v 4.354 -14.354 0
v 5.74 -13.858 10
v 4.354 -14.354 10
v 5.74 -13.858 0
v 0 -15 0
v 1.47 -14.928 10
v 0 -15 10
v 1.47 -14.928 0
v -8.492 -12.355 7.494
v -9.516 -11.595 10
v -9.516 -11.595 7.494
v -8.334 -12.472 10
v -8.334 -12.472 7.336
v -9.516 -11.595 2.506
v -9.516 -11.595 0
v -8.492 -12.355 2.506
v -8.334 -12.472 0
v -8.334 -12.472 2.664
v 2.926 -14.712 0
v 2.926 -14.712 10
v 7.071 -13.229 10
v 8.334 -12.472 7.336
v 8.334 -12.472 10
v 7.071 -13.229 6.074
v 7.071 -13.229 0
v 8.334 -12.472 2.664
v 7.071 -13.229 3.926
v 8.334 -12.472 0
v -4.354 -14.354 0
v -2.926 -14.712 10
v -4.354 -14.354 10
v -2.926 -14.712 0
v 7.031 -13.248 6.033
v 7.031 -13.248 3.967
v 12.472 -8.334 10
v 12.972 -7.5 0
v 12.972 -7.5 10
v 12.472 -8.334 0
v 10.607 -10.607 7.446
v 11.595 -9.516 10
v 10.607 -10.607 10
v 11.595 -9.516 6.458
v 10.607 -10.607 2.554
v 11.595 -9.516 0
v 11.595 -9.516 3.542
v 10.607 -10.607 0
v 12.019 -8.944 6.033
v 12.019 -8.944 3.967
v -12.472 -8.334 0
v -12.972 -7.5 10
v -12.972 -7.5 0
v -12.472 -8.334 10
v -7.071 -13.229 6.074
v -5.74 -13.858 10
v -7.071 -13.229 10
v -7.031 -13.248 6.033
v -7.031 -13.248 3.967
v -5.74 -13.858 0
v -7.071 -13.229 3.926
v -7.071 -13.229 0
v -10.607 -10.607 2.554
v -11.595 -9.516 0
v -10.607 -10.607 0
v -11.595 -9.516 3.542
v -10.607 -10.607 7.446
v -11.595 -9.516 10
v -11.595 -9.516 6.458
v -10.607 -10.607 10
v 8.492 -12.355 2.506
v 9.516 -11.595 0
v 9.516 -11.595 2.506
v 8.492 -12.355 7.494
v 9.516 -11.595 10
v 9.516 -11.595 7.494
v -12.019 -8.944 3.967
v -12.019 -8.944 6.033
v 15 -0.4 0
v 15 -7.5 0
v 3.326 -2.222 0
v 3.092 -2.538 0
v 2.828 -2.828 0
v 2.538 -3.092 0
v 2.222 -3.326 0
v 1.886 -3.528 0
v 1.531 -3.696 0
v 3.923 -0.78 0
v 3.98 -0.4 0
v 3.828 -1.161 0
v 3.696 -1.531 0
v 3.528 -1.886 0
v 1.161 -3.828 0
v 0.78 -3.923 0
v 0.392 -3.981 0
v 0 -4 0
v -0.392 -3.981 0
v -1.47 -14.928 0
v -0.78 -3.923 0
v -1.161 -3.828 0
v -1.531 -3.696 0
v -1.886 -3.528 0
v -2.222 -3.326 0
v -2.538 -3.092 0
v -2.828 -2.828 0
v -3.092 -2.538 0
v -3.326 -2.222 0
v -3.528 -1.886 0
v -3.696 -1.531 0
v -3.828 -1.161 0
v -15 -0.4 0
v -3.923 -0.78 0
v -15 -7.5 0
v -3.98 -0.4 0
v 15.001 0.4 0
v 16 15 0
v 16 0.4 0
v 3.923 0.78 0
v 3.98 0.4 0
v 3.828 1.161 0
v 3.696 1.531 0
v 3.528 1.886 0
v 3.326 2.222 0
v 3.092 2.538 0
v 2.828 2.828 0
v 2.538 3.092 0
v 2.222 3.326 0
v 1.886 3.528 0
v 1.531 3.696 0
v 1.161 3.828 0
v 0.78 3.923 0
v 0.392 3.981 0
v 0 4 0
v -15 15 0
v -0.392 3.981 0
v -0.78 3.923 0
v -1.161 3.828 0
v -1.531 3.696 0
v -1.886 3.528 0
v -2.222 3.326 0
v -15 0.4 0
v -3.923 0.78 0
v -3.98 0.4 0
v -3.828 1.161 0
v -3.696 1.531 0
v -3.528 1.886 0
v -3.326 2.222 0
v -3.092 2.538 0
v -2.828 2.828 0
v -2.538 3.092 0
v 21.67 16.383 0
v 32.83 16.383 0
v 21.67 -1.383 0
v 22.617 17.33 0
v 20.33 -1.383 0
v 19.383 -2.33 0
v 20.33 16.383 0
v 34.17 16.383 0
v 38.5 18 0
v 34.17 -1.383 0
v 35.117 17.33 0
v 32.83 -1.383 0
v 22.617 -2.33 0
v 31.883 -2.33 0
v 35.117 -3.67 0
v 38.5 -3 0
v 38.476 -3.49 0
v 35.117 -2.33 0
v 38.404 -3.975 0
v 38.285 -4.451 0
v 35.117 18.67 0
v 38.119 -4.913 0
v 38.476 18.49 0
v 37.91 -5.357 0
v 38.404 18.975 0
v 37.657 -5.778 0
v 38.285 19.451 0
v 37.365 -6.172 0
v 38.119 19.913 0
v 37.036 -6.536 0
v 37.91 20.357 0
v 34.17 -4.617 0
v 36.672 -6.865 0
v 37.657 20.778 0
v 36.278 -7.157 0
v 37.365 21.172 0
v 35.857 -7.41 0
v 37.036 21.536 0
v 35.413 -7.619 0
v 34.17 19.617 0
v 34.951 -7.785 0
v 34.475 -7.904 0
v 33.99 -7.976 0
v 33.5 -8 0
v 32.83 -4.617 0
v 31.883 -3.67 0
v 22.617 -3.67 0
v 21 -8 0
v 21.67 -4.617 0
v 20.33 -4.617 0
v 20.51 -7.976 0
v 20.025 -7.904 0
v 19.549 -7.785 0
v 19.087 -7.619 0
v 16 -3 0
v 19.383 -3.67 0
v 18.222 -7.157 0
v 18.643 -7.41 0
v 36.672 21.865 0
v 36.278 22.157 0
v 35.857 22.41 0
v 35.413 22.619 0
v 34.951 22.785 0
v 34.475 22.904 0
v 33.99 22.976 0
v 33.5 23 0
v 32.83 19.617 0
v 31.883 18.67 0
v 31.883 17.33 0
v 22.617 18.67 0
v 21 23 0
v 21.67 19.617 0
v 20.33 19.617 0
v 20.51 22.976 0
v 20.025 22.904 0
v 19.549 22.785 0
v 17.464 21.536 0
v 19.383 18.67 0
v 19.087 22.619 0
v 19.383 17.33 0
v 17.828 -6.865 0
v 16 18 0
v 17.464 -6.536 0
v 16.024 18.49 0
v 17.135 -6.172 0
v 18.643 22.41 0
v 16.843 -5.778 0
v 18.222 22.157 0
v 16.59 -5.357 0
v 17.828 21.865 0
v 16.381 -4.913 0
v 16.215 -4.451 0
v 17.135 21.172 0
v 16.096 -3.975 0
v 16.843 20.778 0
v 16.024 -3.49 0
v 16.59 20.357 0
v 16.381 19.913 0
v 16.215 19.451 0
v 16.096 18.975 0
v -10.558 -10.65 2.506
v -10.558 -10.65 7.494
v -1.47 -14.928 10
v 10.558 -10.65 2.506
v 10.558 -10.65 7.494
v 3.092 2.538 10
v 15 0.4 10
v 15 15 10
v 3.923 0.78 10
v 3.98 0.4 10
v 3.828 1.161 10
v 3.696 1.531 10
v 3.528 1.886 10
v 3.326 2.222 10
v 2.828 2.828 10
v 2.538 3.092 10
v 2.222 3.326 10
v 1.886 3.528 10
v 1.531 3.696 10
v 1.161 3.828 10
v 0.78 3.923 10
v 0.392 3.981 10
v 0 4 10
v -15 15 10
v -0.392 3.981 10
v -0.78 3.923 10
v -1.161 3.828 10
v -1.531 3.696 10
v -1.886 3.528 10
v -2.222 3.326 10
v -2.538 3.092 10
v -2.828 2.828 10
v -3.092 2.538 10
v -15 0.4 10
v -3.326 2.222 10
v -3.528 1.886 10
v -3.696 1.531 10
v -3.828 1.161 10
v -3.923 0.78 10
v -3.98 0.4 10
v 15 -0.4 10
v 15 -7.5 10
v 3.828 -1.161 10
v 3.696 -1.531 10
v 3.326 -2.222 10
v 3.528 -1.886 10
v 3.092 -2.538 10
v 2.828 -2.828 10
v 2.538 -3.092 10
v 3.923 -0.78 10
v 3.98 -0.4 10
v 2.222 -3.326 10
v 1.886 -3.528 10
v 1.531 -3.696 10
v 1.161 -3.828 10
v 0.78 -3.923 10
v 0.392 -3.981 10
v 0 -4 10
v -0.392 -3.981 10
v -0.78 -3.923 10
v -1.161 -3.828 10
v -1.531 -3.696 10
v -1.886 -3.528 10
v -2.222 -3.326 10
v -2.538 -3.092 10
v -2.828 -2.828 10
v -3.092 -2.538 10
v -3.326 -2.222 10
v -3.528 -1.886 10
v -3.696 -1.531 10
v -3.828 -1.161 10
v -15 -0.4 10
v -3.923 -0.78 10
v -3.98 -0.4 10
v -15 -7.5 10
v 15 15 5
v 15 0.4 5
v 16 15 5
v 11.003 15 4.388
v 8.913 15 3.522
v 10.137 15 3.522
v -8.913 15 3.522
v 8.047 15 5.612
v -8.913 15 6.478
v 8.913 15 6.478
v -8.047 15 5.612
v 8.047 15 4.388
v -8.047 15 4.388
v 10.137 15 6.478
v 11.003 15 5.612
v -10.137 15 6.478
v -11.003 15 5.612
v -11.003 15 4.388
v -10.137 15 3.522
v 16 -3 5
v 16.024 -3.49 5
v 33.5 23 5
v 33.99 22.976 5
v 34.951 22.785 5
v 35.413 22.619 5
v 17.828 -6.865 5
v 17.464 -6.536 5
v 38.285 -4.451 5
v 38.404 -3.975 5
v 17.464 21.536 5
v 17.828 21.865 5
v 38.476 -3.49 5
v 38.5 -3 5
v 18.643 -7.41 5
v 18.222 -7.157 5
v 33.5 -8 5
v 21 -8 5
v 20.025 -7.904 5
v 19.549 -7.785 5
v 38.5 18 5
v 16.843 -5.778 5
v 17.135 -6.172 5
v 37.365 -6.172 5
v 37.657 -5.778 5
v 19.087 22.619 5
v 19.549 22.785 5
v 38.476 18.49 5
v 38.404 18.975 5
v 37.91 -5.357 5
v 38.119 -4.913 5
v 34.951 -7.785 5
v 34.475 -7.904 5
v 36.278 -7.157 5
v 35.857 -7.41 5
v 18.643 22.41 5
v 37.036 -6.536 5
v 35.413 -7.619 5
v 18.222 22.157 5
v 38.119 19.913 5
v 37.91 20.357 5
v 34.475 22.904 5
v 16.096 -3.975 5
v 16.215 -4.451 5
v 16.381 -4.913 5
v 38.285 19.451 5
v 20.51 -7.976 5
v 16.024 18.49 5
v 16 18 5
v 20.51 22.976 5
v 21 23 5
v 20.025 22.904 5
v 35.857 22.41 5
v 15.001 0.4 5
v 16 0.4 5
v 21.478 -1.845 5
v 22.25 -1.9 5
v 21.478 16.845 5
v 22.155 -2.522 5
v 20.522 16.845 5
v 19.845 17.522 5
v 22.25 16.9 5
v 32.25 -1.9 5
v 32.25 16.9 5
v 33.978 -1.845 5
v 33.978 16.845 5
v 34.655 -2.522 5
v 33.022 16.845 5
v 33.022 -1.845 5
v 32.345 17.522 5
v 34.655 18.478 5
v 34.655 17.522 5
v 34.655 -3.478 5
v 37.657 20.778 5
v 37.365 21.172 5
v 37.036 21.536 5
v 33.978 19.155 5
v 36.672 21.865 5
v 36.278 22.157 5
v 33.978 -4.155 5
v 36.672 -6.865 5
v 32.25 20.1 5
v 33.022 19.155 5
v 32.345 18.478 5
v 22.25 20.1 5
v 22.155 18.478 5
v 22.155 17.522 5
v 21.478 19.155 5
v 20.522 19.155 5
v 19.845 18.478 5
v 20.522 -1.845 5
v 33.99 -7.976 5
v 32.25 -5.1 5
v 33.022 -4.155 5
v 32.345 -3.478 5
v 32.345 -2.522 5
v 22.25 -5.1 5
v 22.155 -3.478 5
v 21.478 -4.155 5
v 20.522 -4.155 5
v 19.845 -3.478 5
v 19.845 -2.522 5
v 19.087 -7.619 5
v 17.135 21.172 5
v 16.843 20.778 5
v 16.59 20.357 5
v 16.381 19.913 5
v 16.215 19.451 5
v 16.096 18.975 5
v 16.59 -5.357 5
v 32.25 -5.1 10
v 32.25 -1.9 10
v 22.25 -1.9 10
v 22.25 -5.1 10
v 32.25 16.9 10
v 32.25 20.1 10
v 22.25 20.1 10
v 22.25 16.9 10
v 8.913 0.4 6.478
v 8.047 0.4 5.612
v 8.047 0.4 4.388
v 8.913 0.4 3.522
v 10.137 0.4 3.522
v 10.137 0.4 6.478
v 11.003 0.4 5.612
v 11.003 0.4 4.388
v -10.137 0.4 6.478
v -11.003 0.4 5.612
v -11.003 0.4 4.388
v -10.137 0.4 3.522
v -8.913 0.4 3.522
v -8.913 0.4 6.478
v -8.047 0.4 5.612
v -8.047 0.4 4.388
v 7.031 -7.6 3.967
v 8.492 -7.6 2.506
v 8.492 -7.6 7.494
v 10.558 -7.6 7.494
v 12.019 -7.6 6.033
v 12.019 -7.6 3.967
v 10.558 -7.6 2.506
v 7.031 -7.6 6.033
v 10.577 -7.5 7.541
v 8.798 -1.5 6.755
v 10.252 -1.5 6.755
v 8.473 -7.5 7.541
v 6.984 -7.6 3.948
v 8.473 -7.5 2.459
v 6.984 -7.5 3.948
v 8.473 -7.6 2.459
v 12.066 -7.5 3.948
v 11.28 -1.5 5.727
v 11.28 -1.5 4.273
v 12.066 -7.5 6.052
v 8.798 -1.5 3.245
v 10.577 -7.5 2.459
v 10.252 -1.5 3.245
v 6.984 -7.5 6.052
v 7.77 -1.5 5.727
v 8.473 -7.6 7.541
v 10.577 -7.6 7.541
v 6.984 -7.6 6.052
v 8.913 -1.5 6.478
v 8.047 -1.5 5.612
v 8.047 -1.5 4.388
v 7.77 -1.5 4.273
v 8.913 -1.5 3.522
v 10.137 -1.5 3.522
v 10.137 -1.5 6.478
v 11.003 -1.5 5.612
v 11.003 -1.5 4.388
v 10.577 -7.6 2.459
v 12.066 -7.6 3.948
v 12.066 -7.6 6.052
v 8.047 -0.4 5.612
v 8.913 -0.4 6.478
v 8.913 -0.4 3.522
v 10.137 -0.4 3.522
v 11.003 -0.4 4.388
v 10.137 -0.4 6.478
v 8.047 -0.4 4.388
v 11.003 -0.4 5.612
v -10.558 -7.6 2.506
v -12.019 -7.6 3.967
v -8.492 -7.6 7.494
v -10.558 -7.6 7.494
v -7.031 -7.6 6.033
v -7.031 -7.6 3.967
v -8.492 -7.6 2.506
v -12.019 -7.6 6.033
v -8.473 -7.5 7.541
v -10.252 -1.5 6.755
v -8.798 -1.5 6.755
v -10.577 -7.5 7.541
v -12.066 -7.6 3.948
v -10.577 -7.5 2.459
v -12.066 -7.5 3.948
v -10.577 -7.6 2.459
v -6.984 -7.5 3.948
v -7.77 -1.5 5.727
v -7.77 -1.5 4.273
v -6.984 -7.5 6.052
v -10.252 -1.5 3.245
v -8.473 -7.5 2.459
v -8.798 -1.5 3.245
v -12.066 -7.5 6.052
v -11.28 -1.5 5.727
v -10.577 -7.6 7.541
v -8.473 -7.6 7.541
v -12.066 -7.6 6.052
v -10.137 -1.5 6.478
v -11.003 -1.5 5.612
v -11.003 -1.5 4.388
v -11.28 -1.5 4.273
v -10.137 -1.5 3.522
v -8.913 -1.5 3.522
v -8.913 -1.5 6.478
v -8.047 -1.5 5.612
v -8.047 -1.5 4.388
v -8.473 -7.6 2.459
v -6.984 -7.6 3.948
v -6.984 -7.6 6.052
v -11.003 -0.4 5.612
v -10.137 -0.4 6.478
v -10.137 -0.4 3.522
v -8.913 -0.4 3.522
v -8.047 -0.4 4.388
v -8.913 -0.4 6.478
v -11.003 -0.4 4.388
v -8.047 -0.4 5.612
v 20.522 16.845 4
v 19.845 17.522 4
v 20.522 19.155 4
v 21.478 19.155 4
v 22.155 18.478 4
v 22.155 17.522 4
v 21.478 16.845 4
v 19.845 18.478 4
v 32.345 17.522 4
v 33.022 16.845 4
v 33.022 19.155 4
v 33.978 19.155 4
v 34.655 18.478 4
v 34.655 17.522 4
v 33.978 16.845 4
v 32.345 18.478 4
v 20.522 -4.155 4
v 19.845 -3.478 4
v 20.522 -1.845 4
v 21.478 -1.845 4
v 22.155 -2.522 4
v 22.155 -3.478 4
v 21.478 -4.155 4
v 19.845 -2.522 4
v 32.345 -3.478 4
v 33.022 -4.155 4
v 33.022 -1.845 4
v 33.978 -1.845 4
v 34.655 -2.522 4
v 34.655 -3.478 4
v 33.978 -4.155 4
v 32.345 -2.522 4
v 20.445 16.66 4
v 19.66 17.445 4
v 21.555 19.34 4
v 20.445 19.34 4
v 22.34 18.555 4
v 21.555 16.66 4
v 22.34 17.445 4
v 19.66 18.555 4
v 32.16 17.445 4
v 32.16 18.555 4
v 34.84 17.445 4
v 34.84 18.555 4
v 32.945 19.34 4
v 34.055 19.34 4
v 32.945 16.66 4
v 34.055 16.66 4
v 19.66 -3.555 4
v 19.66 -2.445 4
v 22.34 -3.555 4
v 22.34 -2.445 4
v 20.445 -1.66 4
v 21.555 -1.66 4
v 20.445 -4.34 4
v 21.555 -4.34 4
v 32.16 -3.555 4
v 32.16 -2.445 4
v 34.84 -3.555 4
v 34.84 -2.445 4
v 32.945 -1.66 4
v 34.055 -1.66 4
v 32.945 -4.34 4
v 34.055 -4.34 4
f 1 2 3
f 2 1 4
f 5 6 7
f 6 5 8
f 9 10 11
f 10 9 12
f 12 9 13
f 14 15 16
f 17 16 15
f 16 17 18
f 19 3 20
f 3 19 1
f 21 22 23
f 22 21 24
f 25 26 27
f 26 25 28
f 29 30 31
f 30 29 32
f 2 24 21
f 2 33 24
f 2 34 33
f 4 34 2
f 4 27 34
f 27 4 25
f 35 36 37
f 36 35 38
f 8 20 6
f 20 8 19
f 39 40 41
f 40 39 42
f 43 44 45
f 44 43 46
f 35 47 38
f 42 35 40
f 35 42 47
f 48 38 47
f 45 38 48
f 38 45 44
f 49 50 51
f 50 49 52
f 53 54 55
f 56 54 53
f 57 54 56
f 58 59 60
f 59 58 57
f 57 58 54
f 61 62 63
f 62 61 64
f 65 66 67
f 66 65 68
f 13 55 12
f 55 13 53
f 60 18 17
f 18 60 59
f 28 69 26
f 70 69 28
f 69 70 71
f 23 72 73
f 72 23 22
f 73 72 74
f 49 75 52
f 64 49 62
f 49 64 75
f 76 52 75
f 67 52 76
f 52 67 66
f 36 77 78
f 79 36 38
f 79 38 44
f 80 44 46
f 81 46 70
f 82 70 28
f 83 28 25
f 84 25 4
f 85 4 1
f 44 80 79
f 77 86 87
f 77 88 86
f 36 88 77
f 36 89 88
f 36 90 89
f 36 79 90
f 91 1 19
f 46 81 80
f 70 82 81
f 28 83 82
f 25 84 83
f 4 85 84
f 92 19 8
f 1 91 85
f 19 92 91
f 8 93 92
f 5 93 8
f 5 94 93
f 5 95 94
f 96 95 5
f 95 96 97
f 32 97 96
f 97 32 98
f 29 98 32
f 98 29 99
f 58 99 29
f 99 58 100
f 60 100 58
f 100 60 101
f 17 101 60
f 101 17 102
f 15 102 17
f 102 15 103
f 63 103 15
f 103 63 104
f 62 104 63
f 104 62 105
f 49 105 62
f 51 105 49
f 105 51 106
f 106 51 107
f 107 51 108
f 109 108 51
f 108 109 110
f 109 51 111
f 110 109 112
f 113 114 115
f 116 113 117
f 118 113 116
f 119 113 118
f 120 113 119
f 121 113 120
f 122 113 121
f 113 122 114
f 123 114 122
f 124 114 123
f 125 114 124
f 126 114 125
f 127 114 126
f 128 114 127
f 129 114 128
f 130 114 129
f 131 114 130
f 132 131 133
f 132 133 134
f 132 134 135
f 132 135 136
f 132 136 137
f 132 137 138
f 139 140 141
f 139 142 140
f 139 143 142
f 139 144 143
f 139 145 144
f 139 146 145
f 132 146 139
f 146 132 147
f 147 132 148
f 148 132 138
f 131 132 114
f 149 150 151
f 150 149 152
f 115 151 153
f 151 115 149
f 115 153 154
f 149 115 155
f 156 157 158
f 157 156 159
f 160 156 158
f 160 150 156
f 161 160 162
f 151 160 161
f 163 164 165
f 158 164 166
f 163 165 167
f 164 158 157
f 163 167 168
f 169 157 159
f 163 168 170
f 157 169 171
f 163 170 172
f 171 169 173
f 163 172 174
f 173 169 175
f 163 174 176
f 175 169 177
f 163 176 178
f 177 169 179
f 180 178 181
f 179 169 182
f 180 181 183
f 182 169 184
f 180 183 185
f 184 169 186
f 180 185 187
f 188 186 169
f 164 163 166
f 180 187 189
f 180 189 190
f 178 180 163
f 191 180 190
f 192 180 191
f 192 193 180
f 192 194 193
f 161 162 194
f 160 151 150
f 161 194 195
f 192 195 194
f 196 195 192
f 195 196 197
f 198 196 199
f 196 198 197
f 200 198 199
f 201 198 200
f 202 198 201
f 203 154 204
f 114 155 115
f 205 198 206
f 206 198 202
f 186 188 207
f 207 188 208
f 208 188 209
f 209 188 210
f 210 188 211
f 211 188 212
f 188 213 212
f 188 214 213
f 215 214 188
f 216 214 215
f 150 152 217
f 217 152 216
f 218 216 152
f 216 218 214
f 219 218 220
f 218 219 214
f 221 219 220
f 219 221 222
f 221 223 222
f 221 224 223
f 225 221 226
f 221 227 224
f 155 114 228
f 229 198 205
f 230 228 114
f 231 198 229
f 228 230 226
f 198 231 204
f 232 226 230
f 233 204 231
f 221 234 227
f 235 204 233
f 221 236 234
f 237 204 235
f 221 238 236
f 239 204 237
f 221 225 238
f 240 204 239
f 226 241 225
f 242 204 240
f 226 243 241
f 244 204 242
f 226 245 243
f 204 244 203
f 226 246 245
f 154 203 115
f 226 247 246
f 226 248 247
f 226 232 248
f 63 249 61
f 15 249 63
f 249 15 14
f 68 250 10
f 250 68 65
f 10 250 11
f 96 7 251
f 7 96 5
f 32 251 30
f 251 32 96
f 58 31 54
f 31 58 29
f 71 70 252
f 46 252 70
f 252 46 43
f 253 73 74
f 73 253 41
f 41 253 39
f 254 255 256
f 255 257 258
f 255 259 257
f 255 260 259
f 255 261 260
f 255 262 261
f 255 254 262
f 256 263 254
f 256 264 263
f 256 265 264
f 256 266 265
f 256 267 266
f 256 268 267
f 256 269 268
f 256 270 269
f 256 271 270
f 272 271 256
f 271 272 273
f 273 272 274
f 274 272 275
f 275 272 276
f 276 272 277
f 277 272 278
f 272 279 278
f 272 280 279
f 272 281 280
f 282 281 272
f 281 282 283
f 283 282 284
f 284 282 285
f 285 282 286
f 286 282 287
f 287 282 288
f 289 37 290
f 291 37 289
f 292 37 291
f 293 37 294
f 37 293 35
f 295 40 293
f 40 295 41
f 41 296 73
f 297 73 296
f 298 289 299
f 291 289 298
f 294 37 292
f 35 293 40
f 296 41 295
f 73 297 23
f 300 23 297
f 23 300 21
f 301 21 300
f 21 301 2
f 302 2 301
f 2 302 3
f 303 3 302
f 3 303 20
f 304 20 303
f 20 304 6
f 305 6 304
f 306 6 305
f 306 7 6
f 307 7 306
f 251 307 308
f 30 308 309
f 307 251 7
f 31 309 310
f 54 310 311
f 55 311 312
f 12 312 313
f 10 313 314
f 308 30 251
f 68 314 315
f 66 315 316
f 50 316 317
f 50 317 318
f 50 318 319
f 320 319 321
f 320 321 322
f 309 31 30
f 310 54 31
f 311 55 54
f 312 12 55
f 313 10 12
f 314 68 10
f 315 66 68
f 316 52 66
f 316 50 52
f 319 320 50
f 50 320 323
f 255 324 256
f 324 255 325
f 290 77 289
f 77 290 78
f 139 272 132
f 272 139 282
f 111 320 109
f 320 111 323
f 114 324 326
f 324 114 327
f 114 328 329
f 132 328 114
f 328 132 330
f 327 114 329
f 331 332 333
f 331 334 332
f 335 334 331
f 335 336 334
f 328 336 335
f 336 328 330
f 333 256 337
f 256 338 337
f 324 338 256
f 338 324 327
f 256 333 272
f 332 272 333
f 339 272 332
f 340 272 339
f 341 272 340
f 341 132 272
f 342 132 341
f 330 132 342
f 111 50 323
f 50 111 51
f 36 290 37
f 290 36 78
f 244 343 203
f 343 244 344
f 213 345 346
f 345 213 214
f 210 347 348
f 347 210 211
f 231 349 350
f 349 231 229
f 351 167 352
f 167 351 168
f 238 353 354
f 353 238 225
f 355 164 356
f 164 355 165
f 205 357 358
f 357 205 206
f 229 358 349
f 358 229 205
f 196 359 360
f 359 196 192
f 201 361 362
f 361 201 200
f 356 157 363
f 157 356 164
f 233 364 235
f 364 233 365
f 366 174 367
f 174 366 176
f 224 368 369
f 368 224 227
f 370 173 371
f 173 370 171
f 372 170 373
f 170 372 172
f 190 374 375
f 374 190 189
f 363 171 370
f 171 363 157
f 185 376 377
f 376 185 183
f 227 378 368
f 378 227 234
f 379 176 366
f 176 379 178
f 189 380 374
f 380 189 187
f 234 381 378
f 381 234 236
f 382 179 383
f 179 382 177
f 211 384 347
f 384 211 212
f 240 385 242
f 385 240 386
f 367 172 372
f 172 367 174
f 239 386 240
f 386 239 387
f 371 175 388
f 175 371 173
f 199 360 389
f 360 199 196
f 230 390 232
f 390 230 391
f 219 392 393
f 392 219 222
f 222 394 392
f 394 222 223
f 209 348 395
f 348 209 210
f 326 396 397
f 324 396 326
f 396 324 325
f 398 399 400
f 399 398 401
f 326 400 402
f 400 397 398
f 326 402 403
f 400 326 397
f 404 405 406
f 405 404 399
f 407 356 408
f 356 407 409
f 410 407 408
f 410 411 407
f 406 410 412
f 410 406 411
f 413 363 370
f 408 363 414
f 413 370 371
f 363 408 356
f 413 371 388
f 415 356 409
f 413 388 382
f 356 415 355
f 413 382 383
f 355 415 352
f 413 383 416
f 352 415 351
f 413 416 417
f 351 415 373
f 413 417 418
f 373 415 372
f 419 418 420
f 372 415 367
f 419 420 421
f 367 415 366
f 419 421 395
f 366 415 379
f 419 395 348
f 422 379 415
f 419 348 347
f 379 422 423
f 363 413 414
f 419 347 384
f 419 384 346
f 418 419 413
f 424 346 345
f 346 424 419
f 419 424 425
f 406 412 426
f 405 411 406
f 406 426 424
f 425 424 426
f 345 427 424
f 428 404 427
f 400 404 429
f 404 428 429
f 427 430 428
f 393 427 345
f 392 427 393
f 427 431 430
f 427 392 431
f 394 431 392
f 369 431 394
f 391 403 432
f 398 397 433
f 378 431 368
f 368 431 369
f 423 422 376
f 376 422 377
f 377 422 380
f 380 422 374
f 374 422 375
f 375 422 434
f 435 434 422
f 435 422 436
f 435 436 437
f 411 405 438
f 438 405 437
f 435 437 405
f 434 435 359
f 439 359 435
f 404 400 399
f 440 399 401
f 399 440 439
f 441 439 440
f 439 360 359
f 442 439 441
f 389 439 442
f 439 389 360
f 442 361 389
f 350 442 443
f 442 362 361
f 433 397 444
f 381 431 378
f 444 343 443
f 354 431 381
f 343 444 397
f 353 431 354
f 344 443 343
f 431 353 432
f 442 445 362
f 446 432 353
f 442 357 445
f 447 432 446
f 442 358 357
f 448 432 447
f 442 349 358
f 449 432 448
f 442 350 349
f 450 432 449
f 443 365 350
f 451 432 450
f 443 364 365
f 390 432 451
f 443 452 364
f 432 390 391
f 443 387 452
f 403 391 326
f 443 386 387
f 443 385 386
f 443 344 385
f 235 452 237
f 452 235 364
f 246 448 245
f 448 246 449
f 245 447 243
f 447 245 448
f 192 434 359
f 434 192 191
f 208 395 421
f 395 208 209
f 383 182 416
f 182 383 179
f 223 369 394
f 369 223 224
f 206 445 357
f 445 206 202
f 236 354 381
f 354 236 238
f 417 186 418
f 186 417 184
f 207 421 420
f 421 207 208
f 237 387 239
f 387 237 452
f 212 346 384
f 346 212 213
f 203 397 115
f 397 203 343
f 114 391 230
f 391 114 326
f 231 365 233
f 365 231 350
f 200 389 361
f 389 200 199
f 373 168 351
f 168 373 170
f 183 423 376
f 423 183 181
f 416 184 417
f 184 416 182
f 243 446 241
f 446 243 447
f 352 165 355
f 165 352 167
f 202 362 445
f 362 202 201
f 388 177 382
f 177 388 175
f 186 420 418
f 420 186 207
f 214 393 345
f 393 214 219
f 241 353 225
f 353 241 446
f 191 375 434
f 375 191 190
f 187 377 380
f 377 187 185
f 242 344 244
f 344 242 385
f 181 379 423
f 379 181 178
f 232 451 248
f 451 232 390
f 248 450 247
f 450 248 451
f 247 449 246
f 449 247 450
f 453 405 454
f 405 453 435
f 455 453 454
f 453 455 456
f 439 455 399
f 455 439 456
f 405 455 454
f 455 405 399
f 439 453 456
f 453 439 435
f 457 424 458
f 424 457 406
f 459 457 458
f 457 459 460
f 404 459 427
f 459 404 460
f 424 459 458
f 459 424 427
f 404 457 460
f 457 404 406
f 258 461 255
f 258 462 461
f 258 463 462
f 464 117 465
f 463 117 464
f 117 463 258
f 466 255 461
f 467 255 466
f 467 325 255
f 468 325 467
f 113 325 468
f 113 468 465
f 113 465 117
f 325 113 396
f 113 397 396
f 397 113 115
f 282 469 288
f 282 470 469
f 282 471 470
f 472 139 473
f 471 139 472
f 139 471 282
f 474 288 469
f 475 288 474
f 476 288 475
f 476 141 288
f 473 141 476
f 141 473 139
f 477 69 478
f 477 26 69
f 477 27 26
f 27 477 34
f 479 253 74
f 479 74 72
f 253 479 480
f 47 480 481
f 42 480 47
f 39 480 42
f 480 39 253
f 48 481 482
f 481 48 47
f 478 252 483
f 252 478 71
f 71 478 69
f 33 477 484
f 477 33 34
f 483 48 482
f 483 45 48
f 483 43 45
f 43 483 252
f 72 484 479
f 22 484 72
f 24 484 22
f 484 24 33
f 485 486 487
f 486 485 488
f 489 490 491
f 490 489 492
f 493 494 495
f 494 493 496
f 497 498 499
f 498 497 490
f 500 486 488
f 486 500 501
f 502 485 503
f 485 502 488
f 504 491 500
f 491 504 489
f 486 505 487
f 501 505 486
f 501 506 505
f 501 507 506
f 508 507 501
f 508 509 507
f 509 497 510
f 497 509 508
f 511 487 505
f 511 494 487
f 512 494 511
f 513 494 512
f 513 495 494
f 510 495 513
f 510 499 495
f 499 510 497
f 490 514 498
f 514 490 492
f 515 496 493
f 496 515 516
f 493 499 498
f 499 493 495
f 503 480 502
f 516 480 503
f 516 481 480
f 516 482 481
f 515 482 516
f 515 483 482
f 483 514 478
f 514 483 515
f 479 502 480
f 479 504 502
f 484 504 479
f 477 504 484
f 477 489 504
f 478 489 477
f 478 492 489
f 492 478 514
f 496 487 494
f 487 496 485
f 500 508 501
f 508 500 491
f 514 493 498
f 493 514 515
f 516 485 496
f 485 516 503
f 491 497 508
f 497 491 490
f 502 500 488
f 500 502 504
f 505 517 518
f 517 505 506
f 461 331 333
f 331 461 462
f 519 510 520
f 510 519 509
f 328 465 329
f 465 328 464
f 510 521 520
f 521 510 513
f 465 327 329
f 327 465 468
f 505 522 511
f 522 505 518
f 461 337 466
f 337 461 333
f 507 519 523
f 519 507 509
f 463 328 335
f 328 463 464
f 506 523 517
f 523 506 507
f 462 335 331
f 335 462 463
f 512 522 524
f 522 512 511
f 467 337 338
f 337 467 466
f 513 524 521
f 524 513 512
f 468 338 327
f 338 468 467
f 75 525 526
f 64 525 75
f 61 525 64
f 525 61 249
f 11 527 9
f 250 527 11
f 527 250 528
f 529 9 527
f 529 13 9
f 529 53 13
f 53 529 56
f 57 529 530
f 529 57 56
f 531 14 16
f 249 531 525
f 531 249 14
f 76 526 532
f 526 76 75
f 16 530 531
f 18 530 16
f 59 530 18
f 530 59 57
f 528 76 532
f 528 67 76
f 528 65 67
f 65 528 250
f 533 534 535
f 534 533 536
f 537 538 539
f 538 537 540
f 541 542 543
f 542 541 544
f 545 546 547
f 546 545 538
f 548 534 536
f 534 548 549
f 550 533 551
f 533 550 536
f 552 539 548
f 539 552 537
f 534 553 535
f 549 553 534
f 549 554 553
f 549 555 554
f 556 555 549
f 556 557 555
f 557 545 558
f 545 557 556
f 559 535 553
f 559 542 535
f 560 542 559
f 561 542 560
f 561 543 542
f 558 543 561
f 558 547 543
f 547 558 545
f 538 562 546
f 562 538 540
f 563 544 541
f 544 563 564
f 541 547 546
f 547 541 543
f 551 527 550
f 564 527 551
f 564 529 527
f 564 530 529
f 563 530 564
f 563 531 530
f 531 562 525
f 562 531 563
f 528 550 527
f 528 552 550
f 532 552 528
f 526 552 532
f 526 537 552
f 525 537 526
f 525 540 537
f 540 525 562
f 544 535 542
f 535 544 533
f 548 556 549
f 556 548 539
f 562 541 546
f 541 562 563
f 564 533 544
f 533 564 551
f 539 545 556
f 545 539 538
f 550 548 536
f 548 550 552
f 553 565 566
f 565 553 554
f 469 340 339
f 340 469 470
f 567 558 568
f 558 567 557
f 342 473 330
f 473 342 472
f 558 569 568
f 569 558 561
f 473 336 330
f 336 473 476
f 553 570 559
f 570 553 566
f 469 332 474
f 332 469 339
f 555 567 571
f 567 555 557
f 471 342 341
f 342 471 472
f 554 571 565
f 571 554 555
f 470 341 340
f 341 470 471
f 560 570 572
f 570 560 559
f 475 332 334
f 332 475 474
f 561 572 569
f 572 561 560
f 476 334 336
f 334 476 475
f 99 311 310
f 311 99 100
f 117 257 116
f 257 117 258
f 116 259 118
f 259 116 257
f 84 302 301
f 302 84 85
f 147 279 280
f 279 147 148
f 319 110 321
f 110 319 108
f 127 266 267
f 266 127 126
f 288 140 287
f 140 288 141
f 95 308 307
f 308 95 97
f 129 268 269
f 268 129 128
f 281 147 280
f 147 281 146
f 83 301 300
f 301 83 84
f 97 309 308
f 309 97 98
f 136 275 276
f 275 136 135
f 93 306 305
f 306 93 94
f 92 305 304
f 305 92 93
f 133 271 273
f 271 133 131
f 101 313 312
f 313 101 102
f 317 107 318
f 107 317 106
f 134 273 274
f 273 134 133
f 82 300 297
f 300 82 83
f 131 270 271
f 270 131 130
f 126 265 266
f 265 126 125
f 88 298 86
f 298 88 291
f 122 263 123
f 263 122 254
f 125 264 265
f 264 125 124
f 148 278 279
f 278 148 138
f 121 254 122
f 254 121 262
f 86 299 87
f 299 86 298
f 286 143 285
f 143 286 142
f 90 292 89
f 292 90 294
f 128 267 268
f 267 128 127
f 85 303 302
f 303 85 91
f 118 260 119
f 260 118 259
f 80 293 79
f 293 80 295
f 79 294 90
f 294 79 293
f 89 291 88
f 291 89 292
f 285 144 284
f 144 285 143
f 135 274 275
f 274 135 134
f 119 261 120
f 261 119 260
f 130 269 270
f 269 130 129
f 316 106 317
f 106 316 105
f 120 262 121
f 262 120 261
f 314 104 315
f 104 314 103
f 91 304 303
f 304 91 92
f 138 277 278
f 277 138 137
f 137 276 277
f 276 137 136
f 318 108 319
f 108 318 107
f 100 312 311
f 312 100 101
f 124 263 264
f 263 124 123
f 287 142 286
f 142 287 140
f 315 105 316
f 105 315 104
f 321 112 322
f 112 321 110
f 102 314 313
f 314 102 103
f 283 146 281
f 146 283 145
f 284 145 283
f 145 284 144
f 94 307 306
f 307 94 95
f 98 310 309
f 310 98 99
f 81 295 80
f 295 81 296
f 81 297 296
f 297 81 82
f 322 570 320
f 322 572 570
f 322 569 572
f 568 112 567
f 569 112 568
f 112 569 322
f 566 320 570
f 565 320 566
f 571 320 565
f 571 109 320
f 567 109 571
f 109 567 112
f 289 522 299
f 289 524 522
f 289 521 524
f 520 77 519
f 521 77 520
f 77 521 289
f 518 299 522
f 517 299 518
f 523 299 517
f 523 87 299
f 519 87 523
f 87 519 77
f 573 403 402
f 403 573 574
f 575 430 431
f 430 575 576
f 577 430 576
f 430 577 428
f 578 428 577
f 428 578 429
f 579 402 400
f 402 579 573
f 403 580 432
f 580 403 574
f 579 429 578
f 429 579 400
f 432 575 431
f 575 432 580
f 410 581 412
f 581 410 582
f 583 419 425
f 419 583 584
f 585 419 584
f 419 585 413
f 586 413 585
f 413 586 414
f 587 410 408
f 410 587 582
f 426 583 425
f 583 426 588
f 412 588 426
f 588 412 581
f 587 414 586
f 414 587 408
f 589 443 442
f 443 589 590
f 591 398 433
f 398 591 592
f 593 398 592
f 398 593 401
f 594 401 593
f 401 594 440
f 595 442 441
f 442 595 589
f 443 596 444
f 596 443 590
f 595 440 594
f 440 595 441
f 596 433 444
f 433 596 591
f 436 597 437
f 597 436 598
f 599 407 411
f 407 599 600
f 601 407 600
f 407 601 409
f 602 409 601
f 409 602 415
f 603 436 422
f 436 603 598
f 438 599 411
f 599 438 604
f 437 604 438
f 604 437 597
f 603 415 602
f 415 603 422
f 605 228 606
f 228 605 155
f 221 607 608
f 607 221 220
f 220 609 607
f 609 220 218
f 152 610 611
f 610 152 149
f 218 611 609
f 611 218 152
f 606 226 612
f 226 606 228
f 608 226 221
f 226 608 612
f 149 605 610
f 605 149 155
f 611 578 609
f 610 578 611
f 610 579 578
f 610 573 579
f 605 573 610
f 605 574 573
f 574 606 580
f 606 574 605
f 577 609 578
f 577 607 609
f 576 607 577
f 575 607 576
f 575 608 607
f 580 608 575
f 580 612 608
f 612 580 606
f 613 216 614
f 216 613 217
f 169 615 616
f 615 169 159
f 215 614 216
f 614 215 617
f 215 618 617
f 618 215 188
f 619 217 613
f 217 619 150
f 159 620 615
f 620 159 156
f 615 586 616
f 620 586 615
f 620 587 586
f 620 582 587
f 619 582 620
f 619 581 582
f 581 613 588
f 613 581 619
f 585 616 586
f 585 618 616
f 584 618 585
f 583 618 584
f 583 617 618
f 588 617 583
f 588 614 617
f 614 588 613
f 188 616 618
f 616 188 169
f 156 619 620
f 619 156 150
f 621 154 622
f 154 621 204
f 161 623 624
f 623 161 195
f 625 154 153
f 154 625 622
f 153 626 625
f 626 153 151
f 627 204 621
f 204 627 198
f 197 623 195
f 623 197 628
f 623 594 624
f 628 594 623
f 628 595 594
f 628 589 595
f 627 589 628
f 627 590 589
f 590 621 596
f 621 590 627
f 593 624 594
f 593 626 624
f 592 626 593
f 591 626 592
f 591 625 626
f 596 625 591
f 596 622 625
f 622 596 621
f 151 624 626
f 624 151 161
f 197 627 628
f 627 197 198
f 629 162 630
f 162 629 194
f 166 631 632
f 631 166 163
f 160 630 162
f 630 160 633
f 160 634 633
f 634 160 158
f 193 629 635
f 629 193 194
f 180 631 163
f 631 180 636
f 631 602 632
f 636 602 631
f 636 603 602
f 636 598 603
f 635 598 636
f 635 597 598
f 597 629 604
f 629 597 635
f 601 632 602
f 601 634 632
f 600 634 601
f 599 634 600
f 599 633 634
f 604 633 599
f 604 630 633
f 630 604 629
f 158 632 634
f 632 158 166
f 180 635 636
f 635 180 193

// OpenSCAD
/* shaft mount for raspberry pi camera. 
 */
inch = 25.4;
eps = 0.001;
eps2 = 0.002;
inf = 10000;
nozzle_width=0.4;
$fn=64;

height = 10.0;
width = 30.0;
split = 0.8;
screw_offset = 3/4*inch / 2.0;

camera_y = 21.0;
camera_x = 12.5;
camera_offset_x = width/2+camera_x/2+5.0/1+1;
camera_offset_y = width/4;

module down_facing_camera() {
    difference() {
        down_facing_camera_body();
        down_facing_camera_holes();
    }
}

module down_facing_camera_body() {
    endstop_body();
    translate([camera_offset_x, camera_offset_y,0])
    camera_body();
    translate([0,split/2,0])
    cube([width, (width-split)/2, height/2]);
}

module down_facing_camera_holes() {
    dia = 8.0;
    endstop_holes(dia);
    translate([camera_offset_x, camera_offset_y,0])
    camera_holes();
}

module endstop(dia) {
    difference() {
        endstop_body();
        endstop_holes(dia);
    }
}

module endstop_body() {
    {
        cylinder(h=height,d=width);
        translate([-width/2,-width/4,0])
        cube([width, 3/4*width, height]);
    }
}
    
module endstop_holes(dia) {
    cylinder(h=3*height, d=dia, center=true);
    cube([width+eps2, split, 3*height], center=true);
    translate([screw_offset, 0, height/2])
    endstop_screw();
    translate([-screw_offset, 0, height/2])
    endstop_screw();
}

module endstop_screw() {
    rotate([-90,0,0])
    rotate([0,0,180/8])
    cylinder(d=3.2,h=2*width,$fn=8,center=true);
    rotate([90,0,0])
    translate([0,0,width/4]) {
        rotate([0,0,180/8])
        cylinder(d=5.4,h=2*width, $fn=8);
        m3_heat_set_insert();
    }
}

module camera_screw_positions() {
     
    {
        translate([-camera_x/2, +camera_y/2,0])
        children();
        translate([+camera_x/2, +camera_y/2,0])
        children();
        translate([-camera_x/2, -camera_y/2,0])
        children();
        translate([+camera_x/2, -camera_y/2,0])
        children();
    }
}

module camera_body() {
    hull()
    camera_screw_positions()
    cylinder(d=10.0,h=height/2);
    
    translate([0,-camera_y/2-0.5,height/2])
    cube([camera_x-2.5,3.2,height],center=true);
    translate([0,+camera_y/2+0.5,height/2])
    cube([camera_x-2.5,3.2,height],center=true);

}

module camera_holes() {
    camera_screw_positions()
    rotate([0,0,180/8])
    cylinder(d=2.5,h=50.0,$fn=8,center=true);
    camera_screw_positions()
    mirror([0,0,1])
    m2_heat_set_insert();
}

/* m3 heat set insert
 * 6.0 mm high
 * dia top 5.0 mm
 * dia bottom 4.0 mm
 * cone 8 degree taper angle, from 4.0mm - 0.2 mm = 3.8mm, height = 6.0 mm
 */

module m3_heat_set_insert() {
    hull() {
        rotate([0,0,180/8])
        cylinder(d=5.5,h=0.1,$fn=8);
        translate([0,0,-6])
        rotate([0,0,180/8])
        cylinder(d=3.8,h=0.1,$fn=8);
    }
}

// M2 X D3.6 X L4.0
// 4.0 mm high
// dia top 3.6 mm
// dia bottom 3.1 mm

module m2_heat_set_insert() {
    hull() {
        rotate([0,0,180/8])
        cylinder(d=3.5,h=0.1,$fn=8);
        translate([0,0,-4])
        rotate([0,0,180/8])
        cylinder(d=2.9,h=0.1,$fn=8);
    }
}

module down_facing_camera_a() {
    difference() {
        down_facing_camera();
        translate([-width/2-eps,-inf,-eps2])
        cube([width+eps2, inf, inf]);
    }
}

module down_facing_camera_b() {
    intersection() {
        down_facing_camera();
        translate([-width/2,-inf,0])
        cube([width, inf, inf]);
    }
}

down_facing_camera();
//down_facing_camera_a();
//down_facing_camera_b();
